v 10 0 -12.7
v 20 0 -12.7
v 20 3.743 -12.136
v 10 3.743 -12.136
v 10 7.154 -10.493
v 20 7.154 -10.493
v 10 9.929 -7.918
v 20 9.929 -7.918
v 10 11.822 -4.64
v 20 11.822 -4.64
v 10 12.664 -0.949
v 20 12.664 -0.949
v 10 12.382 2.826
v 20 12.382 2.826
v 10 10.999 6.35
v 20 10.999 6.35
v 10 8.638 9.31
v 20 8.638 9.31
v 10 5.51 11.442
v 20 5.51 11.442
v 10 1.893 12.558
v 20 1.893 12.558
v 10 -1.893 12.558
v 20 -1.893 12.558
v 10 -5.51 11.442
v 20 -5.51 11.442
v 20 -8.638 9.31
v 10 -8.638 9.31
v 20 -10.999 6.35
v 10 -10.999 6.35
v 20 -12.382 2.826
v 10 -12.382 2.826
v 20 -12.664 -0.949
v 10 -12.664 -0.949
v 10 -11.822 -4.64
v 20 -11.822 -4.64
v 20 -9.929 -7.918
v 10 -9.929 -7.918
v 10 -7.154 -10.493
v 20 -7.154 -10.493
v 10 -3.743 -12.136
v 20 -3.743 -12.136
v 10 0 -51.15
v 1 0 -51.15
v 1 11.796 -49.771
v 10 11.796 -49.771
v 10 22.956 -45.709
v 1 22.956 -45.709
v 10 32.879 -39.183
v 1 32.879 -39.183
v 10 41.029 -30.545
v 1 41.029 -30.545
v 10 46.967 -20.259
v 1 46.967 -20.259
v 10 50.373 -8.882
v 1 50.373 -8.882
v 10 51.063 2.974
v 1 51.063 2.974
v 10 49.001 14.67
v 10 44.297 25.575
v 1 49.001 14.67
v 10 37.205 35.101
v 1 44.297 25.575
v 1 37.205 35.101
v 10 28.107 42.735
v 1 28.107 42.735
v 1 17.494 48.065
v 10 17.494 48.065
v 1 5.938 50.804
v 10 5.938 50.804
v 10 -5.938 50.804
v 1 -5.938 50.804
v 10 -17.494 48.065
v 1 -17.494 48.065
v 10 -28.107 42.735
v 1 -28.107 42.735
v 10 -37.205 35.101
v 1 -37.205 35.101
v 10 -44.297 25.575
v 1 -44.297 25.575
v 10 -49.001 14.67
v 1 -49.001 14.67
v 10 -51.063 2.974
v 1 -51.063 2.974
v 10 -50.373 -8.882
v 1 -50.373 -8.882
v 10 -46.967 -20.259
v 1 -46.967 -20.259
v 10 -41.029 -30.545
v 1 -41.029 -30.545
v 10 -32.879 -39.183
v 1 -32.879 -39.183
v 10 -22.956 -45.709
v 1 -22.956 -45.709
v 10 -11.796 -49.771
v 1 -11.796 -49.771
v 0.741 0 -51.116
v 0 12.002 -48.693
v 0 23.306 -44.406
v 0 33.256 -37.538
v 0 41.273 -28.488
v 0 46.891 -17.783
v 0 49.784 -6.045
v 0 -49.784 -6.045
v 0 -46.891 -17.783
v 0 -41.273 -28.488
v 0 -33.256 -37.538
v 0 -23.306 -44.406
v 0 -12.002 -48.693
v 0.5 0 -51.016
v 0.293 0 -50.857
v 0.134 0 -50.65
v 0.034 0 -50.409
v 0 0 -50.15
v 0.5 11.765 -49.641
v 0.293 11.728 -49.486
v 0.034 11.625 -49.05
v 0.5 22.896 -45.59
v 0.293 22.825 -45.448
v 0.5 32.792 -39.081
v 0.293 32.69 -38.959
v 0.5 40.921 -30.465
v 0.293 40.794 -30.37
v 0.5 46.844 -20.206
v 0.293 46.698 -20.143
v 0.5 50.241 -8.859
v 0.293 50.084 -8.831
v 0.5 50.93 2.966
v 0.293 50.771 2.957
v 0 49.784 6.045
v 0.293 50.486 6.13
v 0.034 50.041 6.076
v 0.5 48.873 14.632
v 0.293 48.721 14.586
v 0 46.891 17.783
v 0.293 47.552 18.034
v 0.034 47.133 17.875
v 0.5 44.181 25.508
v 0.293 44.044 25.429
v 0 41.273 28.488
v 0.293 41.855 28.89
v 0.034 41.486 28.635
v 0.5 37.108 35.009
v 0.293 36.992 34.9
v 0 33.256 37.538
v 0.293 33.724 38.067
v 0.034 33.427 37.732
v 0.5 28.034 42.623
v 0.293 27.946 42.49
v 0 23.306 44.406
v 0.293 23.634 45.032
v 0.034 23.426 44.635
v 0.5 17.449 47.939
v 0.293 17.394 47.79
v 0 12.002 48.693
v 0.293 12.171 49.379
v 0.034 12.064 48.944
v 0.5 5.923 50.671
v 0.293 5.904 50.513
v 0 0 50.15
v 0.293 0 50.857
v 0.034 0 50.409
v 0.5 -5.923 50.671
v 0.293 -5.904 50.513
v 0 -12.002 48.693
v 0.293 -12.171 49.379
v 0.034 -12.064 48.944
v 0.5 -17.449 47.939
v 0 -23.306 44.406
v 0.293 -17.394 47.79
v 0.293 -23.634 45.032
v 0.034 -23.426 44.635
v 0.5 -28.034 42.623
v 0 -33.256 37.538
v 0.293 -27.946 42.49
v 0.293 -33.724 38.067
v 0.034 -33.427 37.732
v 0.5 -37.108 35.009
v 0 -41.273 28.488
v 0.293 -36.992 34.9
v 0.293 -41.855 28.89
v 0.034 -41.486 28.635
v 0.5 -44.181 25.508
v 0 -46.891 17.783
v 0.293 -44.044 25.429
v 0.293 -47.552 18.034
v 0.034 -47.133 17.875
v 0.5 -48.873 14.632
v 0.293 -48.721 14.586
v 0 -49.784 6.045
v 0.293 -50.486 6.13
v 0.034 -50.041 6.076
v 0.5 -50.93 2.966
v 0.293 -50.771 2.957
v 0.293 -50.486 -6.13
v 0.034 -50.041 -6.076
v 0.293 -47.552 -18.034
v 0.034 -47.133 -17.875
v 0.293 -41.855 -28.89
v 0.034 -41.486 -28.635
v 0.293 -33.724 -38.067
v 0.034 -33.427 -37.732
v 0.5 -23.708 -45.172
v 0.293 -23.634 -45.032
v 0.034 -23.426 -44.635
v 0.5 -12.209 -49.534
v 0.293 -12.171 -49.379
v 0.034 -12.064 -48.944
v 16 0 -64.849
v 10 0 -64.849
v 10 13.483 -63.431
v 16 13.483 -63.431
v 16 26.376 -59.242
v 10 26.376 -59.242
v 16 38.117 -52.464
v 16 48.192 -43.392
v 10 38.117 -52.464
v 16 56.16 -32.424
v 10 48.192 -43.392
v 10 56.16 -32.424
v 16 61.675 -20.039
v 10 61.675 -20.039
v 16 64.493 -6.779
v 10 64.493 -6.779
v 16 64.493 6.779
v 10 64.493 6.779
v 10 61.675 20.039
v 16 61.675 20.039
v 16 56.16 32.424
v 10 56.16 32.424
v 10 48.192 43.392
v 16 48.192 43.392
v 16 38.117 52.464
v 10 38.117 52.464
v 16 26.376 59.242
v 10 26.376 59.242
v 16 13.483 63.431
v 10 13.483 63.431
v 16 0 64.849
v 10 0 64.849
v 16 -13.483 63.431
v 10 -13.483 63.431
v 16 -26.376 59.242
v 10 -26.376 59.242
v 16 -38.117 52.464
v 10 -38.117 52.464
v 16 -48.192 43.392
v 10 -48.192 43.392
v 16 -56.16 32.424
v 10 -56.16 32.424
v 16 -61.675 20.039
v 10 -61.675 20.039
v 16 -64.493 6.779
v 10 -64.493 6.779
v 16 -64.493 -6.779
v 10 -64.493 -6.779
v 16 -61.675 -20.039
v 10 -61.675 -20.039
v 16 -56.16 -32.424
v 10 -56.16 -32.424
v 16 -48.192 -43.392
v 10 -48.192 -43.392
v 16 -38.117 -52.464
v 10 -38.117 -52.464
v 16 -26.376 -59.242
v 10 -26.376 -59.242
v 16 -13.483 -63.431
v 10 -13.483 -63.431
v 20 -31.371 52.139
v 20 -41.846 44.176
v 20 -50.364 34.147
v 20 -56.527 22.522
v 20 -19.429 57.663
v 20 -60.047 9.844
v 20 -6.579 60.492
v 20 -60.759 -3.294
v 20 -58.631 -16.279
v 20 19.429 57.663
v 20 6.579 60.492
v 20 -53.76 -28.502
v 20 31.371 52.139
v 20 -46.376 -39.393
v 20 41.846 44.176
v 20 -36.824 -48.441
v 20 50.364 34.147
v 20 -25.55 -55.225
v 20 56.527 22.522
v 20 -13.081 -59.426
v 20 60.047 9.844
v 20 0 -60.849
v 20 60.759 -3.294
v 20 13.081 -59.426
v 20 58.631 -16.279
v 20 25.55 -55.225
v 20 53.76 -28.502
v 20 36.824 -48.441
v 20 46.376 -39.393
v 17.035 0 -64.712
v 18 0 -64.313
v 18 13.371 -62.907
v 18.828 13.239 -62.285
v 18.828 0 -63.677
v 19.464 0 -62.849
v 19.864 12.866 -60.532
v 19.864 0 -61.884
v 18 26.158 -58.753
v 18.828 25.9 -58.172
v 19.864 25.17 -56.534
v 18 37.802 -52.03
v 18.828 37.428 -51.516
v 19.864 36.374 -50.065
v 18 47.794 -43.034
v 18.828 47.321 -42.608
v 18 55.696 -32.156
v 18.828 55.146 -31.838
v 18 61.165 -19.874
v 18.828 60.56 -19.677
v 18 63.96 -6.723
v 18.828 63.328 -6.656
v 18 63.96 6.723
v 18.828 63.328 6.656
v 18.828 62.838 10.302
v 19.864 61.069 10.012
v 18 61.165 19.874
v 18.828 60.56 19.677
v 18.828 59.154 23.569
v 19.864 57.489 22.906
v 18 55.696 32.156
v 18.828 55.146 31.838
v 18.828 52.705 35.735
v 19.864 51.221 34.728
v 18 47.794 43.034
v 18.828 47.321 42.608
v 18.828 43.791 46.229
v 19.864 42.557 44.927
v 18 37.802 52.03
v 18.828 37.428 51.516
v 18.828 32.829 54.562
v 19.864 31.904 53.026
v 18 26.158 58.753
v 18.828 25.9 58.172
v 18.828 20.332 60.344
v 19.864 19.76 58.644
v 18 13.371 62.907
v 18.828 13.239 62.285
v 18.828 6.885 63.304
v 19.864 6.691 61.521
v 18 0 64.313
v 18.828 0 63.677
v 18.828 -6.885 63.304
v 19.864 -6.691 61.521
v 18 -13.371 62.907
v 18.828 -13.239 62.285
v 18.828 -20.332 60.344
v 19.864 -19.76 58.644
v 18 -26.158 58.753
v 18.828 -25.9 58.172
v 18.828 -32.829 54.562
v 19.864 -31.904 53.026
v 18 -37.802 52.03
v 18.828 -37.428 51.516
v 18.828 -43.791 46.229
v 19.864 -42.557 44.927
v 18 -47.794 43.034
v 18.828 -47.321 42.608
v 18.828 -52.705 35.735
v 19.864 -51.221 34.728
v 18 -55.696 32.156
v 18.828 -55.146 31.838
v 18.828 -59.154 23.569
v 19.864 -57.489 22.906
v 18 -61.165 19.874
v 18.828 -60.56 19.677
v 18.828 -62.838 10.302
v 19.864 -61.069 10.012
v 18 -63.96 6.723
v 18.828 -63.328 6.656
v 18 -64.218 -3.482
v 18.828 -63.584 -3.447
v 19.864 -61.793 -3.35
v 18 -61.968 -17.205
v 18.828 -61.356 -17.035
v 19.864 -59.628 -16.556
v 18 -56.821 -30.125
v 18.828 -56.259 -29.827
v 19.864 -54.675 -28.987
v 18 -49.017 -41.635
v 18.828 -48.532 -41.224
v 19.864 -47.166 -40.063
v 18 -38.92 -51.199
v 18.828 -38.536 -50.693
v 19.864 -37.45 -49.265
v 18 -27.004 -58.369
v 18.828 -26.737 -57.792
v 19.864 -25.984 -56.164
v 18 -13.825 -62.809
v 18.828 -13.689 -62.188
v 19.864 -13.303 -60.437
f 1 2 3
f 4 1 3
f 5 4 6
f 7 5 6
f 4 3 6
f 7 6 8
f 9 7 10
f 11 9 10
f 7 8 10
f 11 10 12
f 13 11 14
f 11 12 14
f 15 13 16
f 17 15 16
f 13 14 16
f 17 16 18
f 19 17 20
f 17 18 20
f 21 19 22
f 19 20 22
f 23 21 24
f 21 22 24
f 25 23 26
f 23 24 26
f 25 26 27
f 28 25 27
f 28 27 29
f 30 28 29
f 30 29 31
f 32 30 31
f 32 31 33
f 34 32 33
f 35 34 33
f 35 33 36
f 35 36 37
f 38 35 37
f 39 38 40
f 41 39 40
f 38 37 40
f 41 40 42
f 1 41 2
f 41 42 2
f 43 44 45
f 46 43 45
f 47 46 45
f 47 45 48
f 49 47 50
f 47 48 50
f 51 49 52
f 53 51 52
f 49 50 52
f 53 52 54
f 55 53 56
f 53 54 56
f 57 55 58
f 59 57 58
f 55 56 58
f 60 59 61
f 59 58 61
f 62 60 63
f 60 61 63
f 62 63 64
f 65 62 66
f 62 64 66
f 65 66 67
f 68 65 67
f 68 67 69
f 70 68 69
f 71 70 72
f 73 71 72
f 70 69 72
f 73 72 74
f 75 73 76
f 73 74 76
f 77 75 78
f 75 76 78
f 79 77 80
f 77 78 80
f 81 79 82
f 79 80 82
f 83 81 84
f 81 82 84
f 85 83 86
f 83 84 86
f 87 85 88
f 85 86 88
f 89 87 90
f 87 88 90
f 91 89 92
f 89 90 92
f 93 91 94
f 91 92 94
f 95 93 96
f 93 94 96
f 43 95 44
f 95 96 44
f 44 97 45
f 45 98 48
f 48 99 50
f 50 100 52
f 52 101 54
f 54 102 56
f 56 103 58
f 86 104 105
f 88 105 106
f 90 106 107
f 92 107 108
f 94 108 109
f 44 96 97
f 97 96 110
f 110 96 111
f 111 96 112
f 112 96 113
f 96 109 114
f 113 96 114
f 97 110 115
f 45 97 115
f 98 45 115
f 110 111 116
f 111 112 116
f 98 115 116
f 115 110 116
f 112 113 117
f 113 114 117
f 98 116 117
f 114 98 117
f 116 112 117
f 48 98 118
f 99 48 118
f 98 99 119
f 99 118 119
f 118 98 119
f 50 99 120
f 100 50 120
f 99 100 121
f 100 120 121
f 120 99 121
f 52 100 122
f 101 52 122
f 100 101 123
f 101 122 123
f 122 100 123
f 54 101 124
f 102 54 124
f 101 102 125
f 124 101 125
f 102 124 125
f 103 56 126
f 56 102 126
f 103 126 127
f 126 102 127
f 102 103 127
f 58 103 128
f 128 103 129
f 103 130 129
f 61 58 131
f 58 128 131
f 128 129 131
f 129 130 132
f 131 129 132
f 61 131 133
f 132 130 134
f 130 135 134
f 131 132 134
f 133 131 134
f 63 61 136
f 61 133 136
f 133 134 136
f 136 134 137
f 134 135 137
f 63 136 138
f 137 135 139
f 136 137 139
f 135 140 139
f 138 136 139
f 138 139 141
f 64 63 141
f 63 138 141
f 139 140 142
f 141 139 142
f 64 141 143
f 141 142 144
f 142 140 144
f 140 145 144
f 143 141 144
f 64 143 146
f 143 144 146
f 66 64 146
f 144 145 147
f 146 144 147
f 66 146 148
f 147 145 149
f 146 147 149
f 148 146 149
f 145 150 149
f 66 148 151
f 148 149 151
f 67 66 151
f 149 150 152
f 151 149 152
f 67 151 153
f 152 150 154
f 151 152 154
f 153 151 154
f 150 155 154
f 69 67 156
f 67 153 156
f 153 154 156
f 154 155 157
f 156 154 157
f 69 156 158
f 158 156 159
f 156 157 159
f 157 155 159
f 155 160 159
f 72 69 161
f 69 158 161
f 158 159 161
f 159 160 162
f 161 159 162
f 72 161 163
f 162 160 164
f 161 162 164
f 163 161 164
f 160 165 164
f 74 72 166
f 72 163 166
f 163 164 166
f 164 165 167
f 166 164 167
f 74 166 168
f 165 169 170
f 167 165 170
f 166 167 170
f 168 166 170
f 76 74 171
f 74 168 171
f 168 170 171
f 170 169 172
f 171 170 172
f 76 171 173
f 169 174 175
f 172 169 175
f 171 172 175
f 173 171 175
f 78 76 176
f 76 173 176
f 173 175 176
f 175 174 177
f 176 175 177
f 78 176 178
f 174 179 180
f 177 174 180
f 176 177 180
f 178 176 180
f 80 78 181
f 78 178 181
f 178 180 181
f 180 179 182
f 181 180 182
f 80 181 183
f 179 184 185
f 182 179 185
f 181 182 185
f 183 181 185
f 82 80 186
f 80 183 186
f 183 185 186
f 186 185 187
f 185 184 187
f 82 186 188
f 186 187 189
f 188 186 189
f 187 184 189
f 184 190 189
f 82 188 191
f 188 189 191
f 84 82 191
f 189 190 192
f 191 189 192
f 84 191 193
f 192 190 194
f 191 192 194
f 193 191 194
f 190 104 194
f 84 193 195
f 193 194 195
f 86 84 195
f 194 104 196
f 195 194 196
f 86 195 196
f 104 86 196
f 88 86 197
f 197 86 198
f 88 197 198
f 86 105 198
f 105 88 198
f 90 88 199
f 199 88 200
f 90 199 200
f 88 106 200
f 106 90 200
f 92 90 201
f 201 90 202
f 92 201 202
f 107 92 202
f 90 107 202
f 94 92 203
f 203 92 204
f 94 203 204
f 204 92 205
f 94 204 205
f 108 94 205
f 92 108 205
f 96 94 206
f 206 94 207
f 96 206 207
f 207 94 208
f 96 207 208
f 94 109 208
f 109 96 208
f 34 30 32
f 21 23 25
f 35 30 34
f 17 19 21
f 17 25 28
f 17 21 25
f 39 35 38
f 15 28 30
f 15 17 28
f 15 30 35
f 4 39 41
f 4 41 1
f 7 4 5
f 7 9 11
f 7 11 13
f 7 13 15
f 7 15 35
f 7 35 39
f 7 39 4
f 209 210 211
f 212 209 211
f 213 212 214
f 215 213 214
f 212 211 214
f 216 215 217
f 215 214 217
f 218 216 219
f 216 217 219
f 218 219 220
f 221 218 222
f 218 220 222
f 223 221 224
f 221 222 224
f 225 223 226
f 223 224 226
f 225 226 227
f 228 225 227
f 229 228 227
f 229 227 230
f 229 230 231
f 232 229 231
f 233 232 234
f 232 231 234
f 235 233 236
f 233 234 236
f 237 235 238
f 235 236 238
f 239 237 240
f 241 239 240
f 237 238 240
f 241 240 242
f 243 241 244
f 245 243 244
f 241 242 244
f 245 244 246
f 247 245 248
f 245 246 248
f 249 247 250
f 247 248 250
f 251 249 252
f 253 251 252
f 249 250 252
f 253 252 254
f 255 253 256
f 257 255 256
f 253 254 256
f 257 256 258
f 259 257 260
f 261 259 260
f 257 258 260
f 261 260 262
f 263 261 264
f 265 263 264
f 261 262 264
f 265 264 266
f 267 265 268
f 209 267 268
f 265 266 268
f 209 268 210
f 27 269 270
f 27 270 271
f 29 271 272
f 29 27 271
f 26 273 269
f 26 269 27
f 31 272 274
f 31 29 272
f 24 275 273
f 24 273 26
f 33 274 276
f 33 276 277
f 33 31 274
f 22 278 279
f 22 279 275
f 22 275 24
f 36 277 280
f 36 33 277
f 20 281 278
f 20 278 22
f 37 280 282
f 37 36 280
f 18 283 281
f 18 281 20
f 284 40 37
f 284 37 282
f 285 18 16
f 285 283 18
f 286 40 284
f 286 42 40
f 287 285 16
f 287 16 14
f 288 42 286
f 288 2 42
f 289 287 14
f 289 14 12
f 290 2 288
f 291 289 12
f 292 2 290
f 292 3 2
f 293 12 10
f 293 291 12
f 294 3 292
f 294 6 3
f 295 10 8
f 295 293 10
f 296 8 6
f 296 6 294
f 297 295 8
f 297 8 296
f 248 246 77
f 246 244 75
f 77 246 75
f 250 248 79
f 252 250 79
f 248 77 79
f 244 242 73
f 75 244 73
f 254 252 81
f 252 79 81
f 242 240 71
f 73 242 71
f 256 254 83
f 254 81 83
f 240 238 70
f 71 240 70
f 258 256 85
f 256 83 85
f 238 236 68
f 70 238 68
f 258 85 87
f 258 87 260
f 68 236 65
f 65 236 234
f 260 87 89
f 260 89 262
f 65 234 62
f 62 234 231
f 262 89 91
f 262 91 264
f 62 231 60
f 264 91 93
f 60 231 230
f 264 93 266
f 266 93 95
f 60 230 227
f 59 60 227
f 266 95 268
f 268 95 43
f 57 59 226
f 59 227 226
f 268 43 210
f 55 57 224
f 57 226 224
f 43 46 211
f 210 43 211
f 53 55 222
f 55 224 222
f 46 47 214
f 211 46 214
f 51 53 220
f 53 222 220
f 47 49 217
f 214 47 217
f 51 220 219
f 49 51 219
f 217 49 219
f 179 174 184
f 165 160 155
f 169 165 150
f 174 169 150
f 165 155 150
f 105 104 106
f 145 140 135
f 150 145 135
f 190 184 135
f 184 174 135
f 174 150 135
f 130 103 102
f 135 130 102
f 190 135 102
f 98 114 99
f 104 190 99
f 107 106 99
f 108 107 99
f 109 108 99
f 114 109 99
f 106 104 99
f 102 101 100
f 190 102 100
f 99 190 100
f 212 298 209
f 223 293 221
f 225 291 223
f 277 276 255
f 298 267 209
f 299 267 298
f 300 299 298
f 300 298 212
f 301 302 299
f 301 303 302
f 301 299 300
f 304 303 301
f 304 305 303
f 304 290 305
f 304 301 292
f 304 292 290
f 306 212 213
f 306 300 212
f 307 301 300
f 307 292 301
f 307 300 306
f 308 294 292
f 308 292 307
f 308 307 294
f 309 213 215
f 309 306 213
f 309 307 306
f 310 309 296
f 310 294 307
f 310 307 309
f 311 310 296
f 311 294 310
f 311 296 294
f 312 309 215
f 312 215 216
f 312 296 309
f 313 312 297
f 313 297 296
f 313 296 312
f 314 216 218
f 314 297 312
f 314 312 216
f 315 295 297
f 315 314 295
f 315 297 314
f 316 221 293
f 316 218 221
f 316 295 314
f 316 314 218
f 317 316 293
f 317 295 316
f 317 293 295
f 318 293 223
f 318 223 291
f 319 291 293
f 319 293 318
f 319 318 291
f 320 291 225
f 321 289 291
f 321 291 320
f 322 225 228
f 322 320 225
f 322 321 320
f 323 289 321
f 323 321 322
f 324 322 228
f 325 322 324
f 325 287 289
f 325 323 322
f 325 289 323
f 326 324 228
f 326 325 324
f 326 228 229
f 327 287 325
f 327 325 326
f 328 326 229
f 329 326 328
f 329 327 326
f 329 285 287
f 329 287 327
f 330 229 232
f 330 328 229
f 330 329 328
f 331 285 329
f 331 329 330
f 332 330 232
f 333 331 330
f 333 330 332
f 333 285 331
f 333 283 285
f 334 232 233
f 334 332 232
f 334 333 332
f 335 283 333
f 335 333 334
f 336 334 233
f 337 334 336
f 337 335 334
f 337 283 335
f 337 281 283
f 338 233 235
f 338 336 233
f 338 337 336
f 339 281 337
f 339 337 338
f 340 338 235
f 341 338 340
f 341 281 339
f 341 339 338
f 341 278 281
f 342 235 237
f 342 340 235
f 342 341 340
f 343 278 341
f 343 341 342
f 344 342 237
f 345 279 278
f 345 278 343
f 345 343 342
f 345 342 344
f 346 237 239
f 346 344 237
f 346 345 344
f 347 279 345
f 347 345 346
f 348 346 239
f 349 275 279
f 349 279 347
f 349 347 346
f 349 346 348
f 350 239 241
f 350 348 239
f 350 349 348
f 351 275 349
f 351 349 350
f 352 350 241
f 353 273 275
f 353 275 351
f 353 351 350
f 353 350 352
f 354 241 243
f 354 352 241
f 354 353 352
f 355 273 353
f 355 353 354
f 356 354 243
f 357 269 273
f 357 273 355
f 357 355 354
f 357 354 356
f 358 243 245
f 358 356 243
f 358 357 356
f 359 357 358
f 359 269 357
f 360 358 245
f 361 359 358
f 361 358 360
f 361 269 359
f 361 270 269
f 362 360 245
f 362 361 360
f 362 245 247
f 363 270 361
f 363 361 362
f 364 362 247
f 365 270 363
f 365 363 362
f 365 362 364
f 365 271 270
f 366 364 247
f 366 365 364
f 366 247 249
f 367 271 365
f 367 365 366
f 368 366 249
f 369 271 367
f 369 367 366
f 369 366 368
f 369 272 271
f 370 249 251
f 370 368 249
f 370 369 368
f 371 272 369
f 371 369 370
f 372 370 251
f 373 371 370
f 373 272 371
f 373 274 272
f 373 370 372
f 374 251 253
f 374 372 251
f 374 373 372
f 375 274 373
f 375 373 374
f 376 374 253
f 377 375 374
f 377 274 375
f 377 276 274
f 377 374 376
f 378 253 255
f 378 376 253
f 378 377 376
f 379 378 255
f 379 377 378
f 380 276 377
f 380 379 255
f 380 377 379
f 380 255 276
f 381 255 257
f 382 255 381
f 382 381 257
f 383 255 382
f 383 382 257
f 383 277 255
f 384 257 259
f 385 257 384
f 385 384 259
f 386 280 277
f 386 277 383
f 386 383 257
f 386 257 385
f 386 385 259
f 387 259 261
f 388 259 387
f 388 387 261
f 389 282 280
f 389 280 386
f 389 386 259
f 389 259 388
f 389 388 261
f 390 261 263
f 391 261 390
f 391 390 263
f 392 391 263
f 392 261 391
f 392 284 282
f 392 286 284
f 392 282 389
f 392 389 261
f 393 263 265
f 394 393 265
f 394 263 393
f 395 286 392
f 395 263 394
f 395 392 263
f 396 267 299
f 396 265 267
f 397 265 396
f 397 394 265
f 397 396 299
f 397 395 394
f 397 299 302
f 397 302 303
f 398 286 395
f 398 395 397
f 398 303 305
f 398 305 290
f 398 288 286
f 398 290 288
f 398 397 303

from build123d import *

# Parameters (mm, degrees)
SKETCH1_R           = 51.15
BOSS_EXTRUDE1_DEPTH = 10
SKETCH2_R           = 64.84855049
BOSS_EXTRUDE2_DEPTH = 10
SKETCH3_R           = 12.7
CUT_EXTRUDE1_DEPTH  = 10
FILLET1_R           = 1
FILLET2_R           = 4


with BuildPart() as part:
    # Sketch1 → Boss-Extrude1 (new body)
    with BuildSketch(Plane(origin=(0, 0, 0), x_dir=(0, 0, -1), z_dir=(1, 0, 0))):
        Circle(SKETCH1_R)
    extrude(amount=BOSS_EXTRUDE1_DEPTH)

    # Sketch2 → Boss-Extrude2 (add)
    with BuildSketch(Plane(origin=(10, 0, 0), x_dir=(0, 0, -1), z_dir=(1, 0, 0))):
        Circle(SKETCH2_R)
    extrude(amount=BOSS_EXTRUDE2_DEPTH)

    # Sketch3 → Cut-Extrude1 (cut)
    with BuildSketch(Plane(origin=(20, 0, 0), x_dir=(0, 0, -1), z_dir=(1, 0, 0))):
        Circle(SKETCH3_R)
    extrude(amount=-CUT_EXTRUDE1_DEPTH, mode=Mode.SUBTRACT)

    # Fillet1
    fillet1_edges = [part.edges().sort_by_distance(p)[0] for p in [
        (0, 0, 51.15),
    ]]
    fillet(fillet1_edges, radius=FILLET1_R)

    # Fillet2
    fillet2_edges = [part.edges().sort_by_distance(p)[0] for p in [
        (20, 0, 64.84855049),
    ]]
    fillet(fillet2_edges, radius=FILLET2_R)


solid = part.part
